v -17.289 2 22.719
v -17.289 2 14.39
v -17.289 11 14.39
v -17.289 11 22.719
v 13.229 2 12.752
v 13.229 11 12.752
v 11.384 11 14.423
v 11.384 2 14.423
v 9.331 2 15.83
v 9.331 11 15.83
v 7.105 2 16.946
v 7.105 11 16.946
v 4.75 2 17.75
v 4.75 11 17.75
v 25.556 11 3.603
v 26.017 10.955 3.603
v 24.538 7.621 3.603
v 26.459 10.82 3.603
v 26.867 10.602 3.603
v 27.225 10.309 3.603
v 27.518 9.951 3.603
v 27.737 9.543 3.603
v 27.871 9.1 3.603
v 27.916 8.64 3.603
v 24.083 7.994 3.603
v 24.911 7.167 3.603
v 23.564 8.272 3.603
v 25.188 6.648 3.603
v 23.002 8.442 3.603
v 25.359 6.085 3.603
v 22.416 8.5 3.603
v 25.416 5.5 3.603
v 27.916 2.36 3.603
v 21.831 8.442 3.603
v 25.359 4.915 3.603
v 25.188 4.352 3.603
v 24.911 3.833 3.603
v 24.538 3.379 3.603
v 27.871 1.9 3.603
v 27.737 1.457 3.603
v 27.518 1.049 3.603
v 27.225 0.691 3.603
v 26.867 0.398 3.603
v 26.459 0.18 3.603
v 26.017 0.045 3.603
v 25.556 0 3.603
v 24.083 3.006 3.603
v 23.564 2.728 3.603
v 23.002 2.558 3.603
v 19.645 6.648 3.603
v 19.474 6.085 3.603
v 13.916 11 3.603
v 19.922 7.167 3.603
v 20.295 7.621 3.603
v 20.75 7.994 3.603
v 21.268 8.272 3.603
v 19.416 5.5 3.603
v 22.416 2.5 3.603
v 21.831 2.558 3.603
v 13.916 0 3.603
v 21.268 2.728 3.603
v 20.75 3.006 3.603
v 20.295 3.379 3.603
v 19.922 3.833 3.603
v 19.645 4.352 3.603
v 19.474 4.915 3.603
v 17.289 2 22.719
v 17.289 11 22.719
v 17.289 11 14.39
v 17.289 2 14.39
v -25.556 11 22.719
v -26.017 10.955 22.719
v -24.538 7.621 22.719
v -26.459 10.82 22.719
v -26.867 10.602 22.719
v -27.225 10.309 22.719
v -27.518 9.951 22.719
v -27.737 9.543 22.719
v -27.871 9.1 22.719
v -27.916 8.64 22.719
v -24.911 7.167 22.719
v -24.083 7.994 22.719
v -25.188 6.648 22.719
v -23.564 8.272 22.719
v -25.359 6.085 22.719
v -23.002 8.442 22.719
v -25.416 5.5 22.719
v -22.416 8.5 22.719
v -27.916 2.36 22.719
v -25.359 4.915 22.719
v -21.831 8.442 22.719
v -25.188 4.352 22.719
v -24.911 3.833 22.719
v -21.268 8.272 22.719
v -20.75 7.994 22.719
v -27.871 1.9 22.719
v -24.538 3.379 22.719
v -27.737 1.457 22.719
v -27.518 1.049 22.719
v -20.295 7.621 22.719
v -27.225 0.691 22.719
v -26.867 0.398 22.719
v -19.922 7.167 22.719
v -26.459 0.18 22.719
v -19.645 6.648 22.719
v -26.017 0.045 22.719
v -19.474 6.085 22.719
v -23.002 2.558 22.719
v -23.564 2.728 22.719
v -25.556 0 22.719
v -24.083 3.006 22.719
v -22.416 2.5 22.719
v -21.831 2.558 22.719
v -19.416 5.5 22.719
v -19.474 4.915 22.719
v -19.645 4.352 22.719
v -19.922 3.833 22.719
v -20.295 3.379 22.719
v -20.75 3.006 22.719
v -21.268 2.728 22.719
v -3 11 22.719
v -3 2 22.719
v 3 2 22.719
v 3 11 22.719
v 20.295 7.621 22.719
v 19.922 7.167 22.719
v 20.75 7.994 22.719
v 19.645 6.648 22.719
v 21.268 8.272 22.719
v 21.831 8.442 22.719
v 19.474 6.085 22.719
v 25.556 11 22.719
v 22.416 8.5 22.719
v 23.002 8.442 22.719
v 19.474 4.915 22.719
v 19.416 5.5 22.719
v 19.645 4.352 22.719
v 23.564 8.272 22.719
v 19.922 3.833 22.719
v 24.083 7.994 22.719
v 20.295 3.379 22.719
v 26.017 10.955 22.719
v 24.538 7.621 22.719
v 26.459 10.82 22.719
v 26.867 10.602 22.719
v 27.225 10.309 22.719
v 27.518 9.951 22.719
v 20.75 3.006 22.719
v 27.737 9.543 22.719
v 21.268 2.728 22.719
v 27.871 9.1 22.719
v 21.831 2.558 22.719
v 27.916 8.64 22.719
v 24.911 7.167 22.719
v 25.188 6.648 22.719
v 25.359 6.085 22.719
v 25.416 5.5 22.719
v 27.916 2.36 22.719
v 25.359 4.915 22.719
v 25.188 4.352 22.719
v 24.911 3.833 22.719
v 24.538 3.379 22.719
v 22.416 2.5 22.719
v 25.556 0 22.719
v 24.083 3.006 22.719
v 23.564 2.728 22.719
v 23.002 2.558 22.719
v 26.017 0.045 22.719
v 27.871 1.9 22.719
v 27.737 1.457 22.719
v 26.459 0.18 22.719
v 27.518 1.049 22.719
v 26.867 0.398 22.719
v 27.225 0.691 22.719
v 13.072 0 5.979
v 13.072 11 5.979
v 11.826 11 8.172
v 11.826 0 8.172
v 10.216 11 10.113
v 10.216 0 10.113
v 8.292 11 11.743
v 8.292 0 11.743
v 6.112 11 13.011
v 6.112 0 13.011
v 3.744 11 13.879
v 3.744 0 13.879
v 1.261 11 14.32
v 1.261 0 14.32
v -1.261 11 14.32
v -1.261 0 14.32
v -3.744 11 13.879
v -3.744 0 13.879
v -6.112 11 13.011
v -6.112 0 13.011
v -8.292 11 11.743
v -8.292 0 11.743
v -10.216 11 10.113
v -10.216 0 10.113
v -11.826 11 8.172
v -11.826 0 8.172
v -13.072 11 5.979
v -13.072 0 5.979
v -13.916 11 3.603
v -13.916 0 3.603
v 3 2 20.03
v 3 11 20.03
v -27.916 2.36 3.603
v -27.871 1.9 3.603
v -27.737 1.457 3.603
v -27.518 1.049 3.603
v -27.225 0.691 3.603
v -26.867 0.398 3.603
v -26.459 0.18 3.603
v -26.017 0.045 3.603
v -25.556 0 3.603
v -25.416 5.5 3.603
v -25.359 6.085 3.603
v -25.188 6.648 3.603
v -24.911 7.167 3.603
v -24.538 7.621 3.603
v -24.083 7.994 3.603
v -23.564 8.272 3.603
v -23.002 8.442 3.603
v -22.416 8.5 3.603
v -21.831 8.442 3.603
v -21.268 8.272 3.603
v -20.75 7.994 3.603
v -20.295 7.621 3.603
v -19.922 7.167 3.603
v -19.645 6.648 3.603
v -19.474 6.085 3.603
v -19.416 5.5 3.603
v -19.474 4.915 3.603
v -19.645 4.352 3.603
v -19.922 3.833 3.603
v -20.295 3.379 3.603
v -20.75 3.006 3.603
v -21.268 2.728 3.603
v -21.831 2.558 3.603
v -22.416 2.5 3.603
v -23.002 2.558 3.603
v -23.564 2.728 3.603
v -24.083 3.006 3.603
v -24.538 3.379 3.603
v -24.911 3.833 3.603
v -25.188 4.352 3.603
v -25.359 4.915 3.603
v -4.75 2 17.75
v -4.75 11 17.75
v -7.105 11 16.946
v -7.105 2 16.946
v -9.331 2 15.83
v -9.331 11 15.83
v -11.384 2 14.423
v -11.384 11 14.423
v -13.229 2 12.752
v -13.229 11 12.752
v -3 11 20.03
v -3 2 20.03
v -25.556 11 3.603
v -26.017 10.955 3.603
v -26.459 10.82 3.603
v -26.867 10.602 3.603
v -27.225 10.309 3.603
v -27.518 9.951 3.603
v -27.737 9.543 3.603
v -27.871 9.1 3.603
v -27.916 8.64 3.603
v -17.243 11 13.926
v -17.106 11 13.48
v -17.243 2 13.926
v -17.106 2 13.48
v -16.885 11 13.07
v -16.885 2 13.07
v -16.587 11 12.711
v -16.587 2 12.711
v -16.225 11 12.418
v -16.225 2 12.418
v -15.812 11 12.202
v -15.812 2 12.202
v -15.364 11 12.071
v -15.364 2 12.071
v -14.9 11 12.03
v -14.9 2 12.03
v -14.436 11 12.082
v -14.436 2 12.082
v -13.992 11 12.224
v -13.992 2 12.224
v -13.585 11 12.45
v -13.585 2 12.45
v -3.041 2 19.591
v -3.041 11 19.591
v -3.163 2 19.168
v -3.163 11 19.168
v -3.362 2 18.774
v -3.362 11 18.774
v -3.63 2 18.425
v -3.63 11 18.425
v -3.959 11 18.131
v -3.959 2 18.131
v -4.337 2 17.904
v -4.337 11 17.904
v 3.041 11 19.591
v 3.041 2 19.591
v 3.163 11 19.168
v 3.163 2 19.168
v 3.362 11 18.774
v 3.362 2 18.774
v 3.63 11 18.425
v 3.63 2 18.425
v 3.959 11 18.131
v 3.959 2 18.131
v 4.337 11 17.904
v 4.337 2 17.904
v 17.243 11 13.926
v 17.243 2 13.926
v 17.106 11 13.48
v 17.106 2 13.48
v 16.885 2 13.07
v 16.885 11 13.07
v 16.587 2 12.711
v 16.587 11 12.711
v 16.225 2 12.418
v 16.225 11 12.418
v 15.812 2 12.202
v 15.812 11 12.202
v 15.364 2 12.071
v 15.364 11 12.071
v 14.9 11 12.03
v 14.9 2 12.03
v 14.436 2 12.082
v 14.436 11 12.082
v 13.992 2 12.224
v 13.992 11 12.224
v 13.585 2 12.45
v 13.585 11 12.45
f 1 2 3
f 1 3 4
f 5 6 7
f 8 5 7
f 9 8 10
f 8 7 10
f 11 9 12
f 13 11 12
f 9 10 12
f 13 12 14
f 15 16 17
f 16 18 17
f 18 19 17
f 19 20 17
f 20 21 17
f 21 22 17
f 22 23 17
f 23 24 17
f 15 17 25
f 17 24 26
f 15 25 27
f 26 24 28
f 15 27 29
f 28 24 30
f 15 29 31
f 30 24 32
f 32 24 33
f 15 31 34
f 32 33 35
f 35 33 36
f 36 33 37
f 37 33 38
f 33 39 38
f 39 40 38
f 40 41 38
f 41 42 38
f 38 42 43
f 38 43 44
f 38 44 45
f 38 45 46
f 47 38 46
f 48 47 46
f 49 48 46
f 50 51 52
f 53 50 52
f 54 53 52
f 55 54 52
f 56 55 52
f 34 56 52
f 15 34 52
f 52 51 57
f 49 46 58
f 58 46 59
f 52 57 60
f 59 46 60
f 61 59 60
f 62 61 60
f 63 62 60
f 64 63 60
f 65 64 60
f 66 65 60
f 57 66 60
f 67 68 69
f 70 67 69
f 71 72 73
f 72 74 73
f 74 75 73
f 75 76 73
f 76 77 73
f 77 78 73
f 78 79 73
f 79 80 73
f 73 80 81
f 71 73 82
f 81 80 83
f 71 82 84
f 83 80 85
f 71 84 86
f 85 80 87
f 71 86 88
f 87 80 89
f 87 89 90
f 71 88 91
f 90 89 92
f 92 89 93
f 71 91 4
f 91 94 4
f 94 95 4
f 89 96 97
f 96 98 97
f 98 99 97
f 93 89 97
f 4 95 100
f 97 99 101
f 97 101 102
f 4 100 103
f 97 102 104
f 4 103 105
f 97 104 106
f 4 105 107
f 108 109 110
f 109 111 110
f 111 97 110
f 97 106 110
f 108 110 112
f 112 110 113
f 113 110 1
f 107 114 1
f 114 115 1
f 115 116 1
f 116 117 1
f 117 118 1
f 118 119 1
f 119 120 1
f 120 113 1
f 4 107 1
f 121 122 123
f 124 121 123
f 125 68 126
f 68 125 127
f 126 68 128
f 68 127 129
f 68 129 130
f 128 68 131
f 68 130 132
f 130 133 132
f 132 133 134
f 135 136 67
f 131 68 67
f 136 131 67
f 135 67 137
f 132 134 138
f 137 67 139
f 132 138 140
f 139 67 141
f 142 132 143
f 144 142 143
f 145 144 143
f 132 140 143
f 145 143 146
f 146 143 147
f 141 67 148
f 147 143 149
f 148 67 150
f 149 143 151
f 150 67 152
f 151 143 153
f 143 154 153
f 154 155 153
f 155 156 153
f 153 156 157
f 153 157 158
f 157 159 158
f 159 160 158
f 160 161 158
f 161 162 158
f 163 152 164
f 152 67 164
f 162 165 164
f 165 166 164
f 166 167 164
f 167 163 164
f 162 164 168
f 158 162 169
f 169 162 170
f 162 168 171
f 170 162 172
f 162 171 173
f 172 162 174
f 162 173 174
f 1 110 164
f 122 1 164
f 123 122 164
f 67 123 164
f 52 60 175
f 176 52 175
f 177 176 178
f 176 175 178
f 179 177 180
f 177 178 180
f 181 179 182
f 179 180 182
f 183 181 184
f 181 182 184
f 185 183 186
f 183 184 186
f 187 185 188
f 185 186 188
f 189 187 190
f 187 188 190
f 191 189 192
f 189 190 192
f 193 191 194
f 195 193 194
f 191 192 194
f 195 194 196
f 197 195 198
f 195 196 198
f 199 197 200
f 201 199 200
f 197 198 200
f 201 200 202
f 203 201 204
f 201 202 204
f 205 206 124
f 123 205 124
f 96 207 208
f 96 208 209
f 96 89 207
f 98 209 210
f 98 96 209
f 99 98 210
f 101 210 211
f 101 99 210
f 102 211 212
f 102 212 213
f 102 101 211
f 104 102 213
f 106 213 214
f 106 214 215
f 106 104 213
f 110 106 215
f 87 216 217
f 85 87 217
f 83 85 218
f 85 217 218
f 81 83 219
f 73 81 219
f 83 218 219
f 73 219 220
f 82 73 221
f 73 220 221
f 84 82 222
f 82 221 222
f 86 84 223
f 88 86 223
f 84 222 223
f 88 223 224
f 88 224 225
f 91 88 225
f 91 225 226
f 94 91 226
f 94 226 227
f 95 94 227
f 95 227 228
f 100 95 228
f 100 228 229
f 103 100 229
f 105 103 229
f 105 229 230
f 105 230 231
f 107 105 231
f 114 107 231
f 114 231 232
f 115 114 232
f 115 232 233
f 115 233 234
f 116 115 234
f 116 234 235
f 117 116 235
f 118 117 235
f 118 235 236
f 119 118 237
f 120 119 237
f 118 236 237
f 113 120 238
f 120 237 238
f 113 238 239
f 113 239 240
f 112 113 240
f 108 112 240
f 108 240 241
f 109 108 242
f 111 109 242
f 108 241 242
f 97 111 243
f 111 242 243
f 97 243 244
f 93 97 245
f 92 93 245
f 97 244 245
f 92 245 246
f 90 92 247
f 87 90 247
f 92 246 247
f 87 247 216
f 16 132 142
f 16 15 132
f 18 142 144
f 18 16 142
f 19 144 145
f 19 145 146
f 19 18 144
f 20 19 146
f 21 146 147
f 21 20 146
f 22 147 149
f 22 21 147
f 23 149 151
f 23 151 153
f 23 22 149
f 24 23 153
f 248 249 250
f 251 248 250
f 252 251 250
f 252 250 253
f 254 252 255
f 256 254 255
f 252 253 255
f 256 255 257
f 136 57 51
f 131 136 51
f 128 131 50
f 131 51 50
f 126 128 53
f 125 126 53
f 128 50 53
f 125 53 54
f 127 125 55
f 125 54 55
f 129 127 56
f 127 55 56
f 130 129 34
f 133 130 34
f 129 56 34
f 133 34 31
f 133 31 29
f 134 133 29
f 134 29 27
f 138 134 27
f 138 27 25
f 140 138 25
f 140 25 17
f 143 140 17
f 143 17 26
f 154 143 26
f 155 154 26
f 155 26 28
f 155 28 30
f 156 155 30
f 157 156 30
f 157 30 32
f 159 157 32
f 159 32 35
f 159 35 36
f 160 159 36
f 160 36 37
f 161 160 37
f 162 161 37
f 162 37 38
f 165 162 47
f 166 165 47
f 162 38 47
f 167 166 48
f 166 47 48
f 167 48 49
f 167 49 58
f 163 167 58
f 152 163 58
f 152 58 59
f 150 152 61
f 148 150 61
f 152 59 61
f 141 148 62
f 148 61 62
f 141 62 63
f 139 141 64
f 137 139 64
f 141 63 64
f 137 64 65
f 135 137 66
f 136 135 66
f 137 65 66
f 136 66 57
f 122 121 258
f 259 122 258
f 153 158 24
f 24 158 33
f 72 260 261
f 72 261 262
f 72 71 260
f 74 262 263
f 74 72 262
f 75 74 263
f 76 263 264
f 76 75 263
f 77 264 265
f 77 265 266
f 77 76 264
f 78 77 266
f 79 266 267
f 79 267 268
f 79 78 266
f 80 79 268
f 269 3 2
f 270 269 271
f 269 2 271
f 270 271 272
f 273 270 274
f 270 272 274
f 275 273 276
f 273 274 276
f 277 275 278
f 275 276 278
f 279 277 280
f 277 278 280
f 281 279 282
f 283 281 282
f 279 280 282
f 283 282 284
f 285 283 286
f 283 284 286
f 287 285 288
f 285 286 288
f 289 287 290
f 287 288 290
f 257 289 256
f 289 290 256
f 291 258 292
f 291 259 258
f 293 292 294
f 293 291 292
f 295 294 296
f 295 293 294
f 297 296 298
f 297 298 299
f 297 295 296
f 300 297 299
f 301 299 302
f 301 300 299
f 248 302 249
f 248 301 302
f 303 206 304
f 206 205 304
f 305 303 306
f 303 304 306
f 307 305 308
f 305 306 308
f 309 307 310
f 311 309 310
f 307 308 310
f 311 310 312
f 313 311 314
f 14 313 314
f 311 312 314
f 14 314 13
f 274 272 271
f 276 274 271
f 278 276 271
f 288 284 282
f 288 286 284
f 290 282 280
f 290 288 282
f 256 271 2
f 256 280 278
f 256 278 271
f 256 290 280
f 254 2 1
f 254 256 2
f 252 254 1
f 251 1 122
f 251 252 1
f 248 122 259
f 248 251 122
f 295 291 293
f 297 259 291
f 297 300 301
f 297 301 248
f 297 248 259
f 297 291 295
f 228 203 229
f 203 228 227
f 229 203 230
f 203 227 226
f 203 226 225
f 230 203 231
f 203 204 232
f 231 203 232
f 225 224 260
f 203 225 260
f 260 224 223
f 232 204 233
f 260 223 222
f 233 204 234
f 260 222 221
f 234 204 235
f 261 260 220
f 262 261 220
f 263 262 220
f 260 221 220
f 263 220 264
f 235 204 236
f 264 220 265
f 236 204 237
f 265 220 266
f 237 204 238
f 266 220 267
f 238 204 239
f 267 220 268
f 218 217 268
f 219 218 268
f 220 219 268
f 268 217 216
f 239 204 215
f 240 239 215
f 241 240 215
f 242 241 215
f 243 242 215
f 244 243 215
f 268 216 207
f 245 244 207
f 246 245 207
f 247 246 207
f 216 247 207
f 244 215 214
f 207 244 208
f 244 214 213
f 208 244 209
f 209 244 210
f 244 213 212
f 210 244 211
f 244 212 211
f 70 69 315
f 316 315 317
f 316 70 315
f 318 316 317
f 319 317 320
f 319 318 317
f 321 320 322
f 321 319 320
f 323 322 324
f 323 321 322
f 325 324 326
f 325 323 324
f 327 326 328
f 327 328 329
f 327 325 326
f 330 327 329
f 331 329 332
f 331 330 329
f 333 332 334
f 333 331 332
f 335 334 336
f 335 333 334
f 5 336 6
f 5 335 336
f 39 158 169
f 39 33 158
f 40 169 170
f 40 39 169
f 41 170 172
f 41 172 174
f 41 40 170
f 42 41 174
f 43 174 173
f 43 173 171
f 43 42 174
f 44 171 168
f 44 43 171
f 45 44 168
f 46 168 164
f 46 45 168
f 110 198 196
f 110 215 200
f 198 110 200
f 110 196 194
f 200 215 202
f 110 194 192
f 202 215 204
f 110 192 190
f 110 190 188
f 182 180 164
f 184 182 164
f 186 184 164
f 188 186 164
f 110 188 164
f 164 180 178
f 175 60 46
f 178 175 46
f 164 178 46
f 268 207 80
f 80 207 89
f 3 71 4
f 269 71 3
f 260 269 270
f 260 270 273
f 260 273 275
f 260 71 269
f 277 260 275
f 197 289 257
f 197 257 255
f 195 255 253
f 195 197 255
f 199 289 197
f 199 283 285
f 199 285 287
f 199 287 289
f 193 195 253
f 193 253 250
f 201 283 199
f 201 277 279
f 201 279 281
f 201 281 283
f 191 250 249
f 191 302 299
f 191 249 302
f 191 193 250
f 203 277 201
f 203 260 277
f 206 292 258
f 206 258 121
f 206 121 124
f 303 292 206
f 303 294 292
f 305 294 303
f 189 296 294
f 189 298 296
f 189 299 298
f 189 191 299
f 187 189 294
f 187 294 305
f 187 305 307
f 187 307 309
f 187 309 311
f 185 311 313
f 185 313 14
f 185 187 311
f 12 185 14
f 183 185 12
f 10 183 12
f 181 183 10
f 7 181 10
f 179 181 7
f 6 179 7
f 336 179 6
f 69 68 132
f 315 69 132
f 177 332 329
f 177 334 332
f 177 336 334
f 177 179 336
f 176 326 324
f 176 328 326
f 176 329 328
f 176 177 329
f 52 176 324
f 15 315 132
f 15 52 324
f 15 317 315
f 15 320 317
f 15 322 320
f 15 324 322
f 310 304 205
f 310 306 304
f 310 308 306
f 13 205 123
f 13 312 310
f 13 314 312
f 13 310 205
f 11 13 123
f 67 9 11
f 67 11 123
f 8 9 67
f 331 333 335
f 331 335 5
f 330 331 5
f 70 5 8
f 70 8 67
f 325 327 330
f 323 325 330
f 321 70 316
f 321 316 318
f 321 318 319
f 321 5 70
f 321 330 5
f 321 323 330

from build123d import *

# Parameters (mm, degrees)
BOSS_EXTRUDE1_DEPTH = 11
SKETCH2_R           = 3
CUT_EXTRUDE1_DEPTH  = 30
CUT_EXTRUDE3_DEPTH  = 9
FILLET2_R           = 2.36
FILLET3_R           = 2.36


with BuildPart() as part:
    # Sketch1 → Boss-Extrude1 (new body)
    with BuildSketch(Plane(origin=(0, 0, 0), x_dir=(1, 0, 0), z_dir=(0, 1, 0))):
        with BuildLine():
            Line((-27.916231576, -22.71939994), (27.916231576, -22.71939994))
            Line((27.916231576, -22.71939994), (27.916231576, -3.602655093))
            Line((27.916231576, -3.602655093), (13.916231576, -3.602655093))
            ThreePointArc((13.916231576, -3.602655093), (0, -14.375), (-13.916231576, -3.602655093))
            Line((-13.916231576, -3.602655093), (-27.916231576, -3.602655093))
            Line((-27.916231576, -3.602655093), (-27.916231576, -22.71939994))
        make_face()
    extrude(amount=BOSS_EXTRUDE1_DEPTH)

    # Sketch2 → Cut-Extrude1 (cut)
    with BuildSketch(Plane(origin=(0, 0, 3.602655093), x_dir=(-1, 0, 0), z_dir=(0, 0, -1))):
        with Locations((22.416231576, 5.5)):
            Circle(SKETCH2_R)
        with Locations((-22.416231576, 5.5)):
            Circle(SKETCH2_R)
    extrude(amount=-CUT_EXTRUDE1_DEPTH, mode=Mode.SUBTRACT)

    # Sketch3 → Cut-Extrude3 (cut)
    with BuildSketch(Plane(origin=(0, 11, 0), x_dir=(1, 0, 0), z_dir=(0, 1, 0))):
        with BuildLine():
            Line((-17.288574276, -6.224614407), (-17.288574276, -22.71939994))
            Line((-17.288574276, -22.71939994), (-3, -22.71939994))
            Line((-3, -22.71939994), (-3, -18.128447948))
            ThreePointArc((-3, -18.128447948), (-11.761457171, -14.1176751), (-17.288574276, -6.224614407))
        make_face()
        with BuildLine():
            Line((3, -18.128447948), (3, -22.71939994))
            Line((3, -22.71939994), (17.288574276, -22.71939994))
            Line((17.288574276, -22.71939994), (17.288574276, -6.224614407))
            ThreePointArc((17.288574276, -6.224614407), (11.761457171, -14.1176751), (3, -18.128447948))
        make_face()
    extrude(amount=-CUT_EXTRUDE3_DEPTH, mode=Mode.SUBTRACT)

    # Fillet2
    fillet2_edges = [part.edges().sort_by_distance(p)[0] for p in [
        (-17.288574276, 6.5, 6.224614407),
        (-3, 6.5, 18.128447948),
        (3, 6.5, 18.128447948),
        (17.288574276, 6.5, 6.224614407),
    ]]
    fillet(fillet2_edges, radius=FILLET2_R)

    # Fillet3
    fillet3_edges = [part.edges().sort_by_distance(p)[0] for p in [
        (27.916231576, 11, 13.161027516),
        (-27.916231576, 11, 13.161027516),
        (27.916231576, 0, 13.161027516),
        (-27.916231576, 0, 13.161027516),
    ]]
    fillet(fillet3_edges, radius=FILLET3_R)


solid = part.part
